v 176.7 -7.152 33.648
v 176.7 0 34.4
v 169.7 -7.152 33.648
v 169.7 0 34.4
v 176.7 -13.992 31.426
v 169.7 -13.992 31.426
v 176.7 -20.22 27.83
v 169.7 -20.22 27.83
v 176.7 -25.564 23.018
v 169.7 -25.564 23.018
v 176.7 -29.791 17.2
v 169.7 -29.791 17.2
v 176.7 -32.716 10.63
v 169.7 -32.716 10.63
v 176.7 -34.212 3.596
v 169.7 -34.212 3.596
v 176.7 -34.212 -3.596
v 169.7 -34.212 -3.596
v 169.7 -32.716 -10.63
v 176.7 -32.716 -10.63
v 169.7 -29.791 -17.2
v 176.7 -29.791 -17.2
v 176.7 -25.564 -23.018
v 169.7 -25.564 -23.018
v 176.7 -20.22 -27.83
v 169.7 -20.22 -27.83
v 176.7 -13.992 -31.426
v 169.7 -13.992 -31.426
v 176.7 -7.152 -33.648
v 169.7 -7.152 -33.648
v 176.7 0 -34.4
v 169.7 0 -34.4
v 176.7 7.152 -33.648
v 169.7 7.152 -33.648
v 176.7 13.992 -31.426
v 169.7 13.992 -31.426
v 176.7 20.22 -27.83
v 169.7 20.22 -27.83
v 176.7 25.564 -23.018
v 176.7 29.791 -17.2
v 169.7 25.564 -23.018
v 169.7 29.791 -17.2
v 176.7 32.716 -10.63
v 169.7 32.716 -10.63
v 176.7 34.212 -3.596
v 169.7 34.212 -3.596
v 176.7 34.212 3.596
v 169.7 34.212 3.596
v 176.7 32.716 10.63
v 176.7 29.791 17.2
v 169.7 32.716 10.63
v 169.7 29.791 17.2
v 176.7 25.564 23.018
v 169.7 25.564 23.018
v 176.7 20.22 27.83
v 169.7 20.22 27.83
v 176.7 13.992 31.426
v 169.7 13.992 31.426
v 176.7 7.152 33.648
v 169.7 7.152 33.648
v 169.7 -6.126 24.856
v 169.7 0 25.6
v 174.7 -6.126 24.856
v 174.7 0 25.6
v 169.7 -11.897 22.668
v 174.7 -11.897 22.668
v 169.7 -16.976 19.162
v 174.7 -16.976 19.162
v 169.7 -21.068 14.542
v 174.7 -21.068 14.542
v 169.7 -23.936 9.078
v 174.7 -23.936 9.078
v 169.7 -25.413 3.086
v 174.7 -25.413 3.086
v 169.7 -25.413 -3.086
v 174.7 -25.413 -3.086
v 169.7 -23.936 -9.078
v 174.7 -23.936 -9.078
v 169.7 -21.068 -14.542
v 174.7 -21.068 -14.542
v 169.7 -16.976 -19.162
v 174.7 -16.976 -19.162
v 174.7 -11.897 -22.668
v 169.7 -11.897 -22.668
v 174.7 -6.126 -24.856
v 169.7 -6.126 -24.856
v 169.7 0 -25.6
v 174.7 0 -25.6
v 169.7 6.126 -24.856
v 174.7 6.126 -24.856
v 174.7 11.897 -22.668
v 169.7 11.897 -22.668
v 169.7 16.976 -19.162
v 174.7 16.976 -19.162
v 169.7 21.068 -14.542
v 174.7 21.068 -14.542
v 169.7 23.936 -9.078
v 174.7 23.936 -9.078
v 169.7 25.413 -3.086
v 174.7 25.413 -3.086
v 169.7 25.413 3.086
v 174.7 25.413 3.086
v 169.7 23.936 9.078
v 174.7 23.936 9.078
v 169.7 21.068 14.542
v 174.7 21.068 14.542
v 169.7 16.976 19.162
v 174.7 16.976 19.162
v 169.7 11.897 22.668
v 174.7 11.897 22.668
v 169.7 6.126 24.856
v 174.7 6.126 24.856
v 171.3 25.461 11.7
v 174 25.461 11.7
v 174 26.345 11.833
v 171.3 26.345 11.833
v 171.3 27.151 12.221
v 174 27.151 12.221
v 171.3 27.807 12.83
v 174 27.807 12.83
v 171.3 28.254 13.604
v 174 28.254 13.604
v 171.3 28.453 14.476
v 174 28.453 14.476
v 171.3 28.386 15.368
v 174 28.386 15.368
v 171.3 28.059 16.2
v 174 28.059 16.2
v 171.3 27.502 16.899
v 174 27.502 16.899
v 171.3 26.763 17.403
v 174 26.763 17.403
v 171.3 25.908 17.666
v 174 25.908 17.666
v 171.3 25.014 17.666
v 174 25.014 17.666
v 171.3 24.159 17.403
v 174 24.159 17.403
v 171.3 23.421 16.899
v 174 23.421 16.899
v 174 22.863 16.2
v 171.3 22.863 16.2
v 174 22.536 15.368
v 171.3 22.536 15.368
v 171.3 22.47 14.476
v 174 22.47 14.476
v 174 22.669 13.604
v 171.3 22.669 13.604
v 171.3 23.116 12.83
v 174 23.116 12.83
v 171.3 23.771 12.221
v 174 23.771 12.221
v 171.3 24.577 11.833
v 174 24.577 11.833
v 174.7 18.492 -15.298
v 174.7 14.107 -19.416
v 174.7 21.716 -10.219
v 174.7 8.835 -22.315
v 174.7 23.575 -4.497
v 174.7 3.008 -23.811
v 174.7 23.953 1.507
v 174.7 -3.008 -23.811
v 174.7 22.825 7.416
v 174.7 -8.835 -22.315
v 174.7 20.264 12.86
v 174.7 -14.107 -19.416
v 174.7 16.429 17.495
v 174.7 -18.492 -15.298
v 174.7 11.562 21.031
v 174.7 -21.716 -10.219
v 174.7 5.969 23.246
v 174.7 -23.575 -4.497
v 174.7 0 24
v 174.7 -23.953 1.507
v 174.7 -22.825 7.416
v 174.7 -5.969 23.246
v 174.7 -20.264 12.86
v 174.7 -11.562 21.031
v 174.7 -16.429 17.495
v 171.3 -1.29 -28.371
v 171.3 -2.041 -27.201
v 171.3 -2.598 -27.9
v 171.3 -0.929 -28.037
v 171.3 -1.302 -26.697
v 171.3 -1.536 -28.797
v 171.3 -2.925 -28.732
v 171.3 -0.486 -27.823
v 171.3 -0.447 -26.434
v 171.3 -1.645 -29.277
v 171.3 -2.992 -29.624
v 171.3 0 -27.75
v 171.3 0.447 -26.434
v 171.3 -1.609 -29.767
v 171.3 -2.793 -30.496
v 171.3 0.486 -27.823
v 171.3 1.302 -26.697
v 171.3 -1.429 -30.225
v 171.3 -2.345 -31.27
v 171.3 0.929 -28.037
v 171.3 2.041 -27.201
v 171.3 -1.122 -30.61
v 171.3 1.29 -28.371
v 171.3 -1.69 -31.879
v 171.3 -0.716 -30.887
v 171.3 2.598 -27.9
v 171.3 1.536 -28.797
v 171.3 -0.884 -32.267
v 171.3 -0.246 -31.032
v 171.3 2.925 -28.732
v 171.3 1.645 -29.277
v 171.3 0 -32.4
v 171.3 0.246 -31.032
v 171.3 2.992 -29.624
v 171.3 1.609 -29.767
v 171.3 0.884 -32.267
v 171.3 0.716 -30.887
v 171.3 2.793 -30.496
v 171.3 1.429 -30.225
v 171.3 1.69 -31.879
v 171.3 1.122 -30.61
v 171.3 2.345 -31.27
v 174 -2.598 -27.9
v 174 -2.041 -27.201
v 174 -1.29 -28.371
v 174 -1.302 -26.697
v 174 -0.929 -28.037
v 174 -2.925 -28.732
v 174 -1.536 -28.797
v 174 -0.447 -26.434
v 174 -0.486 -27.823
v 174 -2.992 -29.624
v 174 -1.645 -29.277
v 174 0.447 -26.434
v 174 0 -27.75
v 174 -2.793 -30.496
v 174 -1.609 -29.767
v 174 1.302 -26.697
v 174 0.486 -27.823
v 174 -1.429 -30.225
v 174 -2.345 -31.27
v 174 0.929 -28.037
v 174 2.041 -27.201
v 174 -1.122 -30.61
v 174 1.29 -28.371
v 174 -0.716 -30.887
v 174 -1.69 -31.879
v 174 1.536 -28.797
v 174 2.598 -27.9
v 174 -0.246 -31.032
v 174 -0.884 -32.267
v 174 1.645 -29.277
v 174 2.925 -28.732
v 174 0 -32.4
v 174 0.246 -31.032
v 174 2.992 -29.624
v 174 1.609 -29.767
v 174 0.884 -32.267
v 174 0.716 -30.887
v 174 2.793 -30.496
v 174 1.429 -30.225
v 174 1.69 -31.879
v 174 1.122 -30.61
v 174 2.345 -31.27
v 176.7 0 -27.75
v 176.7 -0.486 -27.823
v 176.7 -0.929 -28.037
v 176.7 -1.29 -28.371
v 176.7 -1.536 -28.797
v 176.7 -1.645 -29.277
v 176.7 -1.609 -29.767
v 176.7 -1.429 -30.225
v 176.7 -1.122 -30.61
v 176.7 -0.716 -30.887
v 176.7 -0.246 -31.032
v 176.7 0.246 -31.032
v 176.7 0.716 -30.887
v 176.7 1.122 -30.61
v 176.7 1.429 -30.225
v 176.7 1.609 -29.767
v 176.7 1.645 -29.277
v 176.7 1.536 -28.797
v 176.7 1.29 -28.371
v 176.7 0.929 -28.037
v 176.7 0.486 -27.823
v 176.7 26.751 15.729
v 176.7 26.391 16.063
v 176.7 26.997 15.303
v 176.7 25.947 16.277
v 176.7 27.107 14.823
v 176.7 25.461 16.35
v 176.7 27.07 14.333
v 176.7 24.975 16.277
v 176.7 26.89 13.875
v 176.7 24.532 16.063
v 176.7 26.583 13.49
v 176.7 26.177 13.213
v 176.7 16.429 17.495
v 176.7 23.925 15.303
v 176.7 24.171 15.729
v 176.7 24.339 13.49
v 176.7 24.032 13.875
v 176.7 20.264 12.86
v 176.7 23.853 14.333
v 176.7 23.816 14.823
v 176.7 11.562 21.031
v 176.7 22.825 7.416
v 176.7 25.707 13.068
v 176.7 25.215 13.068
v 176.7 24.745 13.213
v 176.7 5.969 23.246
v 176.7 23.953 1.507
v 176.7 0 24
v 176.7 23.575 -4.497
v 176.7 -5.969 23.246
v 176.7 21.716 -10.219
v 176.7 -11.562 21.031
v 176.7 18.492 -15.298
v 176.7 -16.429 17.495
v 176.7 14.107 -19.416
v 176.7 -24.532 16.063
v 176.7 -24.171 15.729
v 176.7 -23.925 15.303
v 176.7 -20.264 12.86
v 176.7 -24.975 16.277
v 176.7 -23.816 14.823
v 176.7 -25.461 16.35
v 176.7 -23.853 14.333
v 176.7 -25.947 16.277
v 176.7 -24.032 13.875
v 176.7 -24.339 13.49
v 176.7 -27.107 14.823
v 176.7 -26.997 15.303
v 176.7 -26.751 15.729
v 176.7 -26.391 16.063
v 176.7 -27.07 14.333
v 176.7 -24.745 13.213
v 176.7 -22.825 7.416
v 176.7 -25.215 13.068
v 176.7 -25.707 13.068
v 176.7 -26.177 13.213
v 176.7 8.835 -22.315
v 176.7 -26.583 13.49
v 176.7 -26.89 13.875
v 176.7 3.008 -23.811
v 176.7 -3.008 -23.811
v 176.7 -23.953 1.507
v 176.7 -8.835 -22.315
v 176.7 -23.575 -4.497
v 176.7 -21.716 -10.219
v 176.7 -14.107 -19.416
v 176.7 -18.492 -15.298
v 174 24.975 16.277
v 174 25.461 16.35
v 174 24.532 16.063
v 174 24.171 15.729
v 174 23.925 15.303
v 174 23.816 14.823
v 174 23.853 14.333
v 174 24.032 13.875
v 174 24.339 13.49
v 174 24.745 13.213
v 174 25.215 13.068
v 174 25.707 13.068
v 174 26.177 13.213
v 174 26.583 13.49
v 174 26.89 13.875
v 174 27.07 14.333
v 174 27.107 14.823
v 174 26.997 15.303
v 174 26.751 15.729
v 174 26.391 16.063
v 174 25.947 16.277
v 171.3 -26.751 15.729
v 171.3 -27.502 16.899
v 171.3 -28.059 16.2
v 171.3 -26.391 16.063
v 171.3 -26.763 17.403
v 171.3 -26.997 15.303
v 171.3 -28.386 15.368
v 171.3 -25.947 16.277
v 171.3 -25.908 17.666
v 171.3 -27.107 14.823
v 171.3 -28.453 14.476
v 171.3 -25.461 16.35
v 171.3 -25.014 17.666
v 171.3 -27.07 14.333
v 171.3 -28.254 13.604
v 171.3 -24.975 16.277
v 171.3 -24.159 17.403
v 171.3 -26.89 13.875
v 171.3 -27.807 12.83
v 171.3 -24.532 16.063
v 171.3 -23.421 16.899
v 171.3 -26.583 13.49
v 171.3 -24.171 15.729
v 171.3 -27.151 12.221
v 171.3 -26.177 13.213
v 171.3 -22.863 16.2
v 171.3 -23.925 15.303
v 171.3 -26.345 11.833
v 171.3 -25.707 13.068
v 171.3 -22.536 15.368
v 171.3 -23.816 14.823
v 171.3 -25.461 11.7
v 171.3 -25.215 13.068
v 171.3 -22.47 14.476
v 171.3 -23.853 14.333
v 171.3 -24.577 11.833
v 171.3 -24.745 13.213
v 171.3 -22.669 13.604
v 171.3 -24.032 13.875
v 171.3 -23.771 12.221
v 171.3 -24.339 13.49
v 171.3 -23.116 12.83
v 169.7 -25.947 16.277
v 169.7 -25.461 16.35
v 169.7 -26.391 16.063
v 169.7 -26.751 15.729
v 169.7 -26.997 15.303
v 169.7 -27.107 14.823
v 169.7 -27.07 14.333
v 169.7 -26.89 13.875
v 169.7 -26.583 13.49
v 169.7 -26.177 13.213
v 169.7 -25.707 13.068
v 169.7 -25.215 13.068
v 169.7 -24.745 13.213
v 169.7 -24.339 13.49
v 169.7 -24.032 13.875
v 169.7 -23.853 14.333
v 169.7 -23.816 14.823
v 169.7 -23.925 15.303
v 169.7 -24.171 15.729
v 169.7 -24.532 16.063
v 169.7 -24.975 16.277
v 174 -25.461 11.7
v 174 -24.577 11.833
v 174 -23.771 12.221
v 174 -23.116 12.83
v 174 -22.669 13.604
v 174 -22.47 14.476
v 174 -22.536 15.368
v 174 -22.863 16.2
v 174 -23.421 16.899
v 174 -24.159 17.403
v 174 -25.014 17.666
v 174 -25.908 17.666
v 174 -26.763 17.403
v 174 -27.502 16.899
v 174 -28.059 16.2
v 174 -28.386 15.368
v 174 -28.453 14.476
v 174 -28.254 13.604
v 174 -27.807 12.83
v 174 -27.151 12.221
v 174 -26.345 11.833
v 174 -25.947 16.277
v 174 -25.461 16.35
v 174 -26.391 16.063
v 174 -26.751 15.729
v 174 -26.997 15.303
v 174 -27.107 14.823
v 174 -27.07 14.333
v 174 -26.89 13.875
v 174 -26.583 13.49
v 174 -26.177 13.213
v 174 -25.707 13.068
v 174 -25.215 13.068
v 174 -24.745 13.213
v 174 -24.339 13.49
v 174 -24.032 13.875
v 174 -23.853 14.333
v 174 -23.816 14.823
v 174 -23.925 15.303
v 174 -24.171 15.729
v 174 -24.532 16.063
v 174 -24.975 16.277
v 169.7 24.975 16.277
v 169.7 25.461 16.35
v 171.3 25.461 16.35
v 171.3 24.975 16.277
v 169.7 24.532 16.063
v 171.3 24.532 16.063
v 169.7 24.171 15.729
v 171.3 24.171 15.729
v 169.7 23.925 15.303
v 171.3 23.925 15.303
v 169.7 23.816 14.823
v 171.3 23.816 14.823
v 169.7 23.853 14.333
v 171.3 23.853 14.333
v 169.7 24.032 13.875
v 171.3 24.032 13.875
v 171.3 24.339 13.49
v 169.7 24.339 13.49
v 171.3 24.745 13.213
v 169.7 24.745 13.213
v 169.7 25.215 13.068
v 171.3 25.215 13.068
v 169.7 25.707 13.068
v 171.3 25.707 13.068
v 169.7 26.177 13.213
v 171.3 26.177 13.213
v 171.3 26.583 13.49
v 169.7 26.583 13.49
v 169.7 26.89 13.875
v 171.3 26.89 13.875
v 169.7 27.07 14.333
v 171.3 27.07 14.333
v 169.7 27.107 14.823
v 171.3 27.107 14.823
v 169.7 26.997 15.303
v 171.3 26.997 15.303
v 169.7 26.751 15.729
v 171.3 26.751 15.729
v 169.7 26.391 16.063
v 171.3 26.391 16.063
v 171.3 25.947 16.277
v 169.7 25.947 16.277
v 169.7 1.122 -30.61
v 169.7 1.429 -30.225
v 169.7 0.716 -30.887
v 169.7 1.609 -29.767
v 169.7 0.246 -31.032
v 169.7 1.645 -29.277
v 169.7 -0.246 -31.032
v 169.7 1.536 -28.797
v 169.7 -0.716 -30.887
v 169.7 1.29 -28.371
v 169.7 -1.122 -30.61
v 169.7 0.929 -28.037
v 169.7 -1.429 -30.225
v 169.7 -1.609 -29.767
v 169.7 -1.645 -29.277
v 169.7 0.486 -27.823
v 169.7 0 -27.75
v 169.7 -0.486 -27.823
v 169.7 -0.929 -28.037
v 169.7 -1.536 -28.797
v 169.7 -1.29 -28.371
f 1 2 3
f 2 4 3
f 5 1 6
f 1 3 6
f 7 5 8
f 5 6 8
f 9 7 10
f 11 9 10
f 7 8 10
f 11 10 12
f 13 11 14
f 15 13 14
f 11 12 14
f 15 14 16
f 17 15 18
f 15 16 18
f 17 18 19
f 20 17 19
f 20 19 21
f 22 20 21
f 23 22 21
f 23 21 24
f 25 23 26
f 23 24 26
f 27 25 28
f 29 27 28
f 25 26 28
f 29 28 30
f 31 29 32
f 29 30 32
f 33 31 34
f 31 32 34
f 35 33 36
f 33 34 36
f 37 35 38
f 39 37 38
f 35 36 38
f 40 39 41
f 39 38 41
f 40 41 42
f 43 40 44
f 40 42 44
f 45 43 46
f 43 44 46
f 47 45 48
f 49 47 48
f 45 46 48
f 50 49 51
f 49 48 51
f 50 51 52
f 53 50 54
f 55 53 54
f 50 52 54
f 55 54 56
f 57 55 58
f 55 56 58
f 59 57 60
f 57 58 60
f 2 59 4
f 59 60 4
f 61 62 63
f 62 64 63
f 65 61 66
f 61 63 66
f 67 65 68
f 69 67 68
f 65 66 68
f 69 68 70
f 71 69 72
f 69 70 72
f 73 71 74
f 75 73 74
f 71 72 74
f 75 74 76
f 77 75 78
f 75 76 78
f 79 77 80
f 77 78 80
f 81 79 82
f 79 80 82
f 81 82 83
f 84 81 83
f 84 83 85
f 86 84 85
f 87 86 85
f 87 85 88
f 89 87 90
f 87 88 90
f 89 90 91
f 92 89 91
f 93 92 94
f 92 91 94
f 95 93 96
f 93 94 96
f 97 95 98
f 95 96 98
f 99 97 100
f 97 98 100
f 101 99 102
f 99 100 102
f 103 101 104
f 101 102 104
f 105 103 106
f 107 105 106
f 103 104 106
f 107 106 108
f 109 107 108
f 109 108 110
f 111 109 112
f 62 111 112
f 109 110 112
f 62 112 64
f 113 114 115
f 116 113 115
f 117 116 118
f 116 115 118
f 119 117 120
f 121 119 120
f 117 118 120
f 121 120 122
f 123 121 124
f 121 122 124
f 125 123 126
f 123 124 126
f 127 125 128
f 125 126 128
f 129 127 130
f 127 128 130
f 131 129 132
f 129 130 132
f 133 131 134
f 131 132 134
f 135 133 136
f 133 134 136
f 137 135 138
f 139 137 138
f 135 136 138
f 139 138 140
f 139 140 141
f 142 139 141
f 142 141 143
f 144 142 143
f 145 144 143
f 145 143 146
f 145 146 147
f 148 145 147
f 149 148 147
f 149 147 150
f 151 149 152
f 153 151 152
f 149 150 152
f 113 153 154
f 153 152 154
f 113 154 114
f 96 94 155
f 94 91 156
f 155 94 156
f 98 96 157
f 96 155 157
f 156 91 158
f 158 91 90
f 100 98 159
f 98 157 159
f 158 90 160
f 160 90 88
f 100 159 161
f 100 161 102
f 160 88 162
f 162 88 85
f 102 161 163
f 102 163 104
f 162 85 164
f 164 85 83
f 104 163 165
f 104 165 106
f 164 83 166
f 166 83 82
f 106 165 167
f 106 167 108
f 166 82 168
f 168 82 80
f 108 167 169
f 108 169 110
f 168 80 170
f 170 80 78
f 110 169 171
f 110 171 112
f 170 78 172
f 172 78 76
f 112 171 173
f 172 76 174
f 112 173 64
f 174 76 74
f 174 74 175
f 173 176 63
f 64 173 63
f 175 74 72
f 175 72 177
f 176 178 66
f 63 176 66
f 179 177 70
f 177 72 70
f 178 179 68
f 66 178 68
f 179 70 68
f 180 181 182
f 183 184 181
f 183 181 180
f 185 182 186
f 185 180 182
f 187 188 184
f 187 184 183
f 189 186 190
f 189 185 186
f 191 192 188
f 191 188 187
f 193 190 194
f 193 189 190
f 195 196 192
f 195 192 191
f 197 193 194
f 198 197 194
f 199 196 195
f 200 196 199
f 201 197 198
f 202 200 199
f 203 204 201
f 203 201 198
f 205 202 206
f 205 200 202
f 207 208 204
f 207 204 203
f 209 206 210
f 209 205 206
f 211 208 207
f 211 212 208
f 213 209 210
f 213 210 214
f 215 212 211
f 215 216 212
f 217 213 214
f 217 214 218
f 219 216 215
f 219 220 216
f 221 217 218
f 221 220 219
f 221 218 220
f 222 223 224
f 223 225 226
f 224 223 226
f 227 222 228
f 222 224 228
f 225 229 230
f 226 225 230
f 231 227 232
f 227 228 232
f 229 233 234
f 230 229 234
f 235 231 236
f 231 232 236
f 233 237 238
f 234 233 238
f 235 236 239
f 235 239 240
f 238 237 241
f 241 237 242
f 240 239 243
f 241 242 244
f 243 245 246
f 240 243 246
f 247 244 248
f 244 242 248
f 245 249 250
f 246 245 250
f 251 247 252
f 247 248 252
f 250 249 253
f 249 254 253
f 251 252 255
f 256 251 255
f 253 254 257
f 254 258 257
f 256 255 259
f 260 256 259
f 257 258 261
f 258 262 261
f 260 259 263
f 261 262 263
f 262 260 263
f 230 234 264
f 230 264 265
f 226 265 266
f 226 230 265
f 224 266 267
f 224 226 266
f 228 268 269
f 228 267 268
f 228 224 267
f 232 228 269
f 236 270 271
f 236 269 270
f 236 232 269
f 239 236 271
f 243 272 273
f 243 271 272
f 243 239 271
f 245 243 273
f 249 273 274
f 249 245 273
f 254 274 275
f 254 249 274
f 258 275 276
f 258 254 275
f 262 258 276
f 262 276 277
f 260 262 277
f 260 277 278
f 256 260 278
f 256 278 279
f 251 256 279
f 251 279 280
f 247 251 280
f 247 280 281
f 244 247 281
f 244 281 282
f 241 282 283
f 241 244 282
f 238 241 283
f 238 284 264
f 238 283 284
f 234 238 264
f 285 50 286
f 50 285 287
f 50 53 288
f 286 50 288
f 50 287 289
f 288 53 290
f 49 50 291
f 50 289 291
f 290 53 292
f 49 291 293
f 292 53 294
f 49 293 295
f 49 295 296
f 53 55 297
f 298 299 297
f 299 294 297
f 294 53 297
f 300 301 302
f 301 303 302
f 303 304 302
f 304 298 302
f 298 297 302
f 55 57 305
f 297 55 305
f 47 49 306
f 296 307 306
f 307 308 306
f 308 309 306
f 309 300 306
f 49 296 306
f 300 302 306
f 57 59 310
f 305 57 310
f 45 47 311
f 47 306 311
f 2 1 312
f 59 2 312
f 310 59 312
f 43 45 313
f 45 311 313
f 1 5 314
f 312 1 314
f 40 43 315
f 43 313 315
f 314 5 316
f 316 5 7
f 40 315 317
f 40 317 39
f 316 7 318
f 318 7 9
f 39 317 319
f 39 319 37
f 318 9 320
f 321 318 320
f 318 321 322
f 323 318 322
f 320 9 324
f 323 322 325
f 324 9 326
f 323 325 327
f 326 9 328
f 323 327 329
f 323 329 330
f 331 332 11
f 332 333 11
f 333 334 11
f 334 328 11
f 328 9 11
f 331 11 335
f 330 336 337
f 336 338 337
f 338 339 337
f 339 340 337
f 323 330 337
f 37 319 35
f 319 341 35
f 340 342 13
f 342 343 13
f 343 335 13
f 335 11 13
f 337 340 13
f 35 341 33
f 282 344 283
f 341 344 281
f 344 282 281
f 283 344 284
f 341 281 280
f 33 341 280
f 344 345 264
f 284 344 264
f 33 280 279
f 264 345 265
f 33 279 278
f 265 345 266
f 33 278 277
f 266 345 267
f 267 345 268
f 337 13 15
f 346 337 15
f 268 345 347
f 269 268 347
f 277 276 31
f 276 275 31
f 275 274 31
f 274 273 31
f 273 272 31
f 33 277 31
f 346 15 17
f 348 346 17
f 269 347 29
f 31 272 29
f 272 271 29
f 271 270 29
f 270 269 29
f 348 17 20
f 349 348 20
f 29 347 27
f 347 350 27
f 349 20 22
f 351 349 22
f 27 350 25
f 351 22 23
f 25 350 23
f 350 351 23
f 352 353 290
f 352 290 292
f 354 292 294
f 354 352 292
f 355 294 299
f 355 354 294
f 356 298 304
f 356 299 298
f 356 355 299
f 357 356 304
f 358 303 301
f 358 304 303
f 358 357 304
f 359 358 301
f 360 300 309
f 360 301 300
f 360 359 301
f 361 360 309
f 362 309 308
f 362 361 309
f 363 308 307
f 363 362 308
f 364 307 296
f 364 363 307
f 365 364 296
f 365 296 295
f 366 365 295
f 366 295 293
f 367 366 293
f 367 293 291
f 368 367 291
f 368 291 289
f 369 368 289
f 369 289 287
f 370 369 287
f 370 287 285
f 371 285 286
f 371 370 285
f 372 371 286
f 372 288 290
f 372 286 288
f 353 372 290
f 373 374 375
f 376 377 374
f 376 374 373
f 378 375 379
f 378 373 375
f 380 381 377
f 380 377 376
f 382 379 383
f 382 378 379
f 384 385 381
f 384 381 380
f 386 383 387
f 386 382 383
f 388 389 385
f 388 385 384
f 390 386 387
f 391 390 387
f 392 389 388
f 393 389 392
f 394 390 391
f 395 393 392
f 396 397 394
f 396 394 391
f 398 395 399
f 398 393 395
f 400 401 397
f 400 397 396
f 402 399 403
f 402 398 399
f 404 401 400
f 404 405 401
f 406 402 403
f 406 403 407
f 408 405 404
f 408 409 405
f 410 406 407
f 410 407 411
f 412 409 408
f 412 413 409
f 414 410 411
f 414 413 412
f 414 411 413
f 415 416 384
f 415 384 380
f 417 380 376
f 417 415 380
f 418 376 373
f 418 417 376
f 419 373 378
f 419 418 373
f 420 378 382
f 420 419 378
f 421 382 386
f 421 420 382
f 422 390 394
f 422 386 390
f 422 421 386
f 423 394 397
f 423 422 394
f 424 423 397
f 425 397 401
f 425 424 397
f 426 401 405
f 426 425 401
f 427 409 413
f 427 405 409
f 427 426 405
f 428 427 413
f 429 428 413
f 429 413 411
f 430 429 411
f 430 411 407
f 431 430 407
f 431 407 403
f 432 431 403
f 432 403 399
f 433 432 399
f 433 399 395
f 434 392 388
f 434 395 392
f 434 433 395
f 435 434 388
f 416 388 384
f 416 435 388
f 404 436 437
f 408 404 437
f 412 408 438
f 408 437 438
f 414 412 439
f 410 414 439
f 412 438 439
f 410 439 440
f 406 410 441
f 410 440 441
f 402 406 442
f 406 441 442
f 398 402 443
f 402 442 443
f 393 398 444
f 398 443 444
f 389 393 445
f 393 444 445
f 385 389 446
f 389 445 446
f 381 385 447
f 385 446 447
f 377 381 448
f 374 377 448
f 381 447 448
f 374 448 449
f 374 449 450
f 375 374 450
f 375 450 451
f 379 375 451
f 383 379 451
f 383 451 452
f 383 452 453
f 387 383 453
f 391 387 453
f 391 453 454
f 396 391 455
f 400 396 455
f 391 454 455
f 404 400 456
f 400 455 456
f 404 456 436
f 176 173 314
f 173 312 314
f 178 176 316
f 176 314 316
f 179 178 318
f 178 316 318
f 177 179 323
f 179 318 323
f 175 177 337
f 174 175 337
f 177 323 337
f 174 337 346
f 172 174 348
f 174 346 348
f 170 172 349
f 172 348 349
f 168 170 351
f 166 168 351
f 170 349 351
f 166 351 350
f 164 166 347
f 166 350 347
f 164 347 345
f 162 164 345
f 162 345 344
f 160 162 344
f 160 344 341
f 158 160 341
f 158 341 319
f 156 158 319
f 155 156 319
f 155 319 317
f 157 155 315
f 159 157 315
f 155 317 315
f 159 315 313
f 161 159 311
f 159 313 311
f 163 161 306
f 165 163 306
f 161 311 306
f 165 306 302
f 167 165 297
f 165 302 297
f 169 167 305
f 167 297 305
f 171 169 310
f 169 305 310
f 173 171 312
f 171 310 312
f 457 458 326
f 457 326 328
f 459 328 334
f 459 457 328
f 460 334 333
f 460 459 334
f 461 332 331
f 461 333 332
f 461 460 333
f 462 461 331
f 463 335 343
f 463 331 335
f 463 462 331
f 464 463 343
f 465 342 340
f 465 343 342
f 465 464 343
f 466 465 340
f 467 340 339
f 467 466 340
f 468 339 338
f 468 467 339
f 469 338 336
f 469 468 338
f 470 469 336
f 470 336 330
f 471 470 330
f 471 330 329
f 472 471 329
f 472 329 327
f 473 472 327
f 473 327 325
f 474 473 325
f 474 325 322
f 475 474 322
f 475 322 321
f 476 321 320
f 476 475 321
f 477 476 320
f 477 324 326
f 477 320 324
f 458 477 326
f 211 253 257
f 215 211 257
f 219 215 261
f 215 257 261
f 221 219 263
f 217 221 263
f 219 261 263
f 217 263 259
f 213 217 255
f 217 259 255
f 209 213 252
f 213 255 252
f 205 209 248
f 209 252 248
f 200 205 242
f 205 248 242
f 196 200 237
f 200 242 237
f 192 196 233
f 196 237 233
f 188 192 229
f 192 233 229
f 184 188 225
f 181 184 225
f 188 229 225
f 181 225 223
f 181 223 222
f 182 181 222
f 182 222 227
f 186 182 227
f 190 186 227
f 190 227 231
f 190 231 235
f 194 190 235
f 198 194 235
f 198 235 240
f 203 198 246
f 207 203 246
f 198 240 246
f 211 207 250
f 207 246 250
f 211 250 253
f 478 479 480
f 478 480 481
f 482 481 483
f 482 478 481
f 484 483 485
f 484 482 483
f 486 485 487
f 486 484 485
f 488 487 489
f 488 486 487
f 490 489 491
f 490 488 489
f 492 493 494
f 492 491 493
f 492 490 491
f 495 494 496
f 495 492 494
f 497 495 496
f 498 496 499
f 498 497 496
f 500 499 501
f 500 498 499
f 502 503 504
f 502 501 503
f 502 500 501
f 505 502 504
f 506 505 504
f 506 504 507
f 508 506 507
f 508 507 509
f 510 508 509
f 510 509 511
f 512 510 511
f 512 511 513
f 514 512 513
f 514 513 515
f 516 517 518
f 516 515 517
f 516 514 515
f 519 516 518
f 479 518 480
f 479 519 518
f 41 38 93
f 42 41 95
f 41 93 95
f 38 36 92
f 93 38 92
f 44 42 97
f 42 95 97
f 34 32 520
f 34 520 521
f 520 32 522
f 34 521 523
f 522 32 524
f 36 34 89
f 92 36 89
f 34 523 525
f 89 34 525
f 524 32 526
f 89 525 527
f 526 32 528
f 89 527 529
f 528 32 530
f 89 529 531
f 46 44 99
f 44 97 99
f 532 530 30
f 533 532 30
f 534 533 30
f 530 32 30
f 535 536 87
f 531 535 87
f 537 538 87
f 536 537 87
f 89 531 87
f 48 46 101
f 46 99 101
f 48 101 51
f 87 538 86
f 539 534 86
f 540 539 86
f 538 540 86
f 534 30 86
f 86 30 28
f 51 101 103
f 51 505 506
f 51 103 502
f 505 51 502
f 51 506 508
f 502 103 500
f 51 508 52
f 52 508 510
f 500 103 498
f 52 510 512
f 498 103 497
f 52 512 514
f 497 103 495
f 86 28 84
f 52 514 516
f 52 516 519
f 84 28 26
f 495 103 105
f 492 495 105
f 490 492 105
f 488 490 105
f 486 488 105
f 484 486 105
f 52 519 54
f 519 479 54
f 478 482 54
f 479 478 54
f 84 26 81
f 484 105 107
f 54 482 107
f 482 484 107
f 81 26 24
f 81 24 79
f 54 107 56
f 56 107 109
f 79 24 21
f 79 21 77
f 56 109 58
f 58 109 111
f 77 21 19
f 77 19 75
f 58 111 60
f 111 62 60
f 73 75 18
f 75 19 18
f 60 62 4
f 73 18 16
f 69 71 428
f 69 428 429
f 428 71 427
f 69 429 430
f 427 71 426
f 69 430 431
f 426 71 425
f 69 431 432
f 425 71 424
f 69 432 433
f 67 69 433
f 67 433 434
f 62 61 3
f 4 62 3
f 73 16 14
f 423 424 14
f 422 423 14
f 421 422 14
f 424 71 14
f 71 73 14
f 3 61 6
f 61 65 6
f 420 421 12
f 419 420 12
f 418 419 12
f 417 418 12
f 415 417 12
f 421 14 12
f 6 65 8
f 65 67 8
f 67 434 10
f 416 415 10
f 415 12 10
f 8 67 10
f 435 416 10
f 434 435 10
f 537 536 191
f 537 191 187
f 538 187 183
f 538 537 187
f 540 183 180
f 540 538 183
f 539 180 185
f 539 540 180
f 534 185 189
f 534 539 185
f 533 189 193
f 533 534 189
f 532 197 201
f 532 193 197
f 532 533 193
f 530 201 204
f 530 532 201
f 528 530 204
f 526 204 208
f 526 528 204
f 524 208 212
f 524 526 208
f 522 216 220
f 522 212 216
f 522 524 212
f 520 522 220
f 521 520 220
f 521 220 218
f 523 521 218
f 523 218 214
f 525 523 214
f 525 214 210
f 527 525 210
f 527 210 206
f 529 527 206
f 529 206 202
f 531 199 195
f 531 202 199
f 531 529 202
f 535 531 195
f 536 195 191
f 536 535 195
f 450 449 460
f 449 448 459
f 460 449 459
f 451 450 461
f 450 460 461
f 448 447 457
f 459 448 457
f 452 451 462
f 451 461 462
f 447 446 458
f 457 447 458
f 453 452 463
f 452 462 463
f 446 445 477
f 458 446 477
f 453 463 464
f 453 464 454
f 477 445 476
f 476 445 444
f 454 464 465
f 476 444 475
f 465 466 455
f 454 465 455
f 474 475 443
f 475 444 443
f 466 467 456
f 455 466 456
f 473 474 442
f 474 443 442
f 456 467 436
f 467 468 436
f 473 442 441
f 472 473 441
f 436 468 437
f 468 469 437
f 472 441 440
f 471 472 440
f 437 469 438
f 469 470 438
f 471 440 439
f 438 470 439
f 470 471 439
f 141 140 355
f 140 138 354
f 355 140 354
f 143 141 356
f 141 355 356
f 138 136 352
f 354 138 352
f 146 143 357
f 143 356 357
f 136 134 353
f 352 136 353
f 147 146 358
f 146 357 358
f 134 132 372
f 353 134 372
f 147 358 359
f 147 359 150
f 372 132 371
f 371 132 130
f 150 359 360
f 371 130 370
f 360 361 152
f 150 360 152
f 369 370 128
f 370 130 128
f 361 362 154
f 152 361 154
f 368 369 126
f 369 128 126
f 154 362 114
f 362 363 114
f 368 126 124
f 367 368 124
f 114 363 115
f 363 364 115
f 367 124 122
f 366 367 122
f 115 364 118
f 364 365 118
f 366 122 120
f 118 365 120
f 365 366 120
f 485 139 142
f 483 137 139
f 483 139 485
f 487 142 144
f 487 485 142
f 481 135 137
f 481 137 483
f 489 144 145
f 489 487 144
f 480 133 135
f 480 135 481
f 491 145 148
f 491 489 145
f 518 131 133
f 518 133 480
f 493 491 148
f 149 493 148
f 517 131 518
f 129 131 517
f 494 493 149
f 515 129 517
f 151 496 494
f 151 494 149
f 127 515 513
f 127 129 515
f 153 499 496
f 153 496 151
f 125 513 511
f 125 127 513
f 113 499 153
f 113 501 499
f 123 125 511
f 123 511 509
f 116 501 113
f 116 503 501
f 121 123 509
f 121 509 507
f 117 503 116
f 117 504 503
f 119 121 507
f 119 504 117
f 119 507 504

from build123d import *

# Parameters (mm, degrees)
AXIAL_HOLES_DEPTH      = 184.274684558
AXIAL_HOLES_DEPTH_BACK = 184.274684558
SKETCH2_R              = 1.65
CUT_EXTRUDE2_START     = 174
SKETCH3_R              = 3
CUT_EXTRUDE2_DEPTH     = 2.7


with BuildPart() as part:
    # Axial profile (mm) → Full revolution (revolve)
    with BuildSketch(Plane.XY, mode=Mode.PRIVATE) as full_revolution_sk:
        Polygon((169.7, 25.6), (174.7, 25.6), (174.7, 24), (176.7, 24), (176.7, 34.4), (169.7, 34.4), align=None)
    revolve(full_revolution_sk.sketch.rotate(Axis((-110, 0, 0), (1, 0, 0)), 90), axis=Axis((-110, 0, 0), (1, 0, 0)))

    # Sketch2 → Axial holes (cut, two sides: drawn at the far end of the back side and taken through both)
    with BuildSketch(Plane(origin=(0, 0, 0), x_dir=(0, 0, -1), z_dir=(1, 0, 0)).offset(-AXIAL_HOLES_DEPTH_BACK)):
        with Locations(Location((29.4, 0, 0), (0, 0, 180))):
            Circle(SKETCH2_R)
        with Locations(Location((-14.7, 25.461146871, 0), (0, 0, 180))):
            Circle(SKETCH2_R)
        with Locations(Location((-14.7, -25.461146871, 0), (0, 0, 180))):
            Circle(SKETCH2_R)
    extrude(amount=AXIAL_HOLES_DEPTH + AXIAL_HOLES_DEPTH_BACK, mode=Mode.SUBTRACT)

    # Sketch3 → Cut-Extrude2 (cut)
    with BuildSketch(Plane(origin=(0, 0, 0), x_dir=(0, 0, -1), z_dir=(1, 0, 0)).offset(CUT_EXTRUDE2_START)):
        with Locations((29.4, 0)):
            Circle(SKETCH3_R)
        with Locations((-14.7, 25.461146871)):
            Circle(SKETCH3_R)
        with Locations((-14.7, -25.461146871)):
            Circle(SKETCH3_R)
    extrude(amount=-CUT_EXTRUDE2_DEPTH, mode=Mode.SUBTRACT)


solid = part.part
